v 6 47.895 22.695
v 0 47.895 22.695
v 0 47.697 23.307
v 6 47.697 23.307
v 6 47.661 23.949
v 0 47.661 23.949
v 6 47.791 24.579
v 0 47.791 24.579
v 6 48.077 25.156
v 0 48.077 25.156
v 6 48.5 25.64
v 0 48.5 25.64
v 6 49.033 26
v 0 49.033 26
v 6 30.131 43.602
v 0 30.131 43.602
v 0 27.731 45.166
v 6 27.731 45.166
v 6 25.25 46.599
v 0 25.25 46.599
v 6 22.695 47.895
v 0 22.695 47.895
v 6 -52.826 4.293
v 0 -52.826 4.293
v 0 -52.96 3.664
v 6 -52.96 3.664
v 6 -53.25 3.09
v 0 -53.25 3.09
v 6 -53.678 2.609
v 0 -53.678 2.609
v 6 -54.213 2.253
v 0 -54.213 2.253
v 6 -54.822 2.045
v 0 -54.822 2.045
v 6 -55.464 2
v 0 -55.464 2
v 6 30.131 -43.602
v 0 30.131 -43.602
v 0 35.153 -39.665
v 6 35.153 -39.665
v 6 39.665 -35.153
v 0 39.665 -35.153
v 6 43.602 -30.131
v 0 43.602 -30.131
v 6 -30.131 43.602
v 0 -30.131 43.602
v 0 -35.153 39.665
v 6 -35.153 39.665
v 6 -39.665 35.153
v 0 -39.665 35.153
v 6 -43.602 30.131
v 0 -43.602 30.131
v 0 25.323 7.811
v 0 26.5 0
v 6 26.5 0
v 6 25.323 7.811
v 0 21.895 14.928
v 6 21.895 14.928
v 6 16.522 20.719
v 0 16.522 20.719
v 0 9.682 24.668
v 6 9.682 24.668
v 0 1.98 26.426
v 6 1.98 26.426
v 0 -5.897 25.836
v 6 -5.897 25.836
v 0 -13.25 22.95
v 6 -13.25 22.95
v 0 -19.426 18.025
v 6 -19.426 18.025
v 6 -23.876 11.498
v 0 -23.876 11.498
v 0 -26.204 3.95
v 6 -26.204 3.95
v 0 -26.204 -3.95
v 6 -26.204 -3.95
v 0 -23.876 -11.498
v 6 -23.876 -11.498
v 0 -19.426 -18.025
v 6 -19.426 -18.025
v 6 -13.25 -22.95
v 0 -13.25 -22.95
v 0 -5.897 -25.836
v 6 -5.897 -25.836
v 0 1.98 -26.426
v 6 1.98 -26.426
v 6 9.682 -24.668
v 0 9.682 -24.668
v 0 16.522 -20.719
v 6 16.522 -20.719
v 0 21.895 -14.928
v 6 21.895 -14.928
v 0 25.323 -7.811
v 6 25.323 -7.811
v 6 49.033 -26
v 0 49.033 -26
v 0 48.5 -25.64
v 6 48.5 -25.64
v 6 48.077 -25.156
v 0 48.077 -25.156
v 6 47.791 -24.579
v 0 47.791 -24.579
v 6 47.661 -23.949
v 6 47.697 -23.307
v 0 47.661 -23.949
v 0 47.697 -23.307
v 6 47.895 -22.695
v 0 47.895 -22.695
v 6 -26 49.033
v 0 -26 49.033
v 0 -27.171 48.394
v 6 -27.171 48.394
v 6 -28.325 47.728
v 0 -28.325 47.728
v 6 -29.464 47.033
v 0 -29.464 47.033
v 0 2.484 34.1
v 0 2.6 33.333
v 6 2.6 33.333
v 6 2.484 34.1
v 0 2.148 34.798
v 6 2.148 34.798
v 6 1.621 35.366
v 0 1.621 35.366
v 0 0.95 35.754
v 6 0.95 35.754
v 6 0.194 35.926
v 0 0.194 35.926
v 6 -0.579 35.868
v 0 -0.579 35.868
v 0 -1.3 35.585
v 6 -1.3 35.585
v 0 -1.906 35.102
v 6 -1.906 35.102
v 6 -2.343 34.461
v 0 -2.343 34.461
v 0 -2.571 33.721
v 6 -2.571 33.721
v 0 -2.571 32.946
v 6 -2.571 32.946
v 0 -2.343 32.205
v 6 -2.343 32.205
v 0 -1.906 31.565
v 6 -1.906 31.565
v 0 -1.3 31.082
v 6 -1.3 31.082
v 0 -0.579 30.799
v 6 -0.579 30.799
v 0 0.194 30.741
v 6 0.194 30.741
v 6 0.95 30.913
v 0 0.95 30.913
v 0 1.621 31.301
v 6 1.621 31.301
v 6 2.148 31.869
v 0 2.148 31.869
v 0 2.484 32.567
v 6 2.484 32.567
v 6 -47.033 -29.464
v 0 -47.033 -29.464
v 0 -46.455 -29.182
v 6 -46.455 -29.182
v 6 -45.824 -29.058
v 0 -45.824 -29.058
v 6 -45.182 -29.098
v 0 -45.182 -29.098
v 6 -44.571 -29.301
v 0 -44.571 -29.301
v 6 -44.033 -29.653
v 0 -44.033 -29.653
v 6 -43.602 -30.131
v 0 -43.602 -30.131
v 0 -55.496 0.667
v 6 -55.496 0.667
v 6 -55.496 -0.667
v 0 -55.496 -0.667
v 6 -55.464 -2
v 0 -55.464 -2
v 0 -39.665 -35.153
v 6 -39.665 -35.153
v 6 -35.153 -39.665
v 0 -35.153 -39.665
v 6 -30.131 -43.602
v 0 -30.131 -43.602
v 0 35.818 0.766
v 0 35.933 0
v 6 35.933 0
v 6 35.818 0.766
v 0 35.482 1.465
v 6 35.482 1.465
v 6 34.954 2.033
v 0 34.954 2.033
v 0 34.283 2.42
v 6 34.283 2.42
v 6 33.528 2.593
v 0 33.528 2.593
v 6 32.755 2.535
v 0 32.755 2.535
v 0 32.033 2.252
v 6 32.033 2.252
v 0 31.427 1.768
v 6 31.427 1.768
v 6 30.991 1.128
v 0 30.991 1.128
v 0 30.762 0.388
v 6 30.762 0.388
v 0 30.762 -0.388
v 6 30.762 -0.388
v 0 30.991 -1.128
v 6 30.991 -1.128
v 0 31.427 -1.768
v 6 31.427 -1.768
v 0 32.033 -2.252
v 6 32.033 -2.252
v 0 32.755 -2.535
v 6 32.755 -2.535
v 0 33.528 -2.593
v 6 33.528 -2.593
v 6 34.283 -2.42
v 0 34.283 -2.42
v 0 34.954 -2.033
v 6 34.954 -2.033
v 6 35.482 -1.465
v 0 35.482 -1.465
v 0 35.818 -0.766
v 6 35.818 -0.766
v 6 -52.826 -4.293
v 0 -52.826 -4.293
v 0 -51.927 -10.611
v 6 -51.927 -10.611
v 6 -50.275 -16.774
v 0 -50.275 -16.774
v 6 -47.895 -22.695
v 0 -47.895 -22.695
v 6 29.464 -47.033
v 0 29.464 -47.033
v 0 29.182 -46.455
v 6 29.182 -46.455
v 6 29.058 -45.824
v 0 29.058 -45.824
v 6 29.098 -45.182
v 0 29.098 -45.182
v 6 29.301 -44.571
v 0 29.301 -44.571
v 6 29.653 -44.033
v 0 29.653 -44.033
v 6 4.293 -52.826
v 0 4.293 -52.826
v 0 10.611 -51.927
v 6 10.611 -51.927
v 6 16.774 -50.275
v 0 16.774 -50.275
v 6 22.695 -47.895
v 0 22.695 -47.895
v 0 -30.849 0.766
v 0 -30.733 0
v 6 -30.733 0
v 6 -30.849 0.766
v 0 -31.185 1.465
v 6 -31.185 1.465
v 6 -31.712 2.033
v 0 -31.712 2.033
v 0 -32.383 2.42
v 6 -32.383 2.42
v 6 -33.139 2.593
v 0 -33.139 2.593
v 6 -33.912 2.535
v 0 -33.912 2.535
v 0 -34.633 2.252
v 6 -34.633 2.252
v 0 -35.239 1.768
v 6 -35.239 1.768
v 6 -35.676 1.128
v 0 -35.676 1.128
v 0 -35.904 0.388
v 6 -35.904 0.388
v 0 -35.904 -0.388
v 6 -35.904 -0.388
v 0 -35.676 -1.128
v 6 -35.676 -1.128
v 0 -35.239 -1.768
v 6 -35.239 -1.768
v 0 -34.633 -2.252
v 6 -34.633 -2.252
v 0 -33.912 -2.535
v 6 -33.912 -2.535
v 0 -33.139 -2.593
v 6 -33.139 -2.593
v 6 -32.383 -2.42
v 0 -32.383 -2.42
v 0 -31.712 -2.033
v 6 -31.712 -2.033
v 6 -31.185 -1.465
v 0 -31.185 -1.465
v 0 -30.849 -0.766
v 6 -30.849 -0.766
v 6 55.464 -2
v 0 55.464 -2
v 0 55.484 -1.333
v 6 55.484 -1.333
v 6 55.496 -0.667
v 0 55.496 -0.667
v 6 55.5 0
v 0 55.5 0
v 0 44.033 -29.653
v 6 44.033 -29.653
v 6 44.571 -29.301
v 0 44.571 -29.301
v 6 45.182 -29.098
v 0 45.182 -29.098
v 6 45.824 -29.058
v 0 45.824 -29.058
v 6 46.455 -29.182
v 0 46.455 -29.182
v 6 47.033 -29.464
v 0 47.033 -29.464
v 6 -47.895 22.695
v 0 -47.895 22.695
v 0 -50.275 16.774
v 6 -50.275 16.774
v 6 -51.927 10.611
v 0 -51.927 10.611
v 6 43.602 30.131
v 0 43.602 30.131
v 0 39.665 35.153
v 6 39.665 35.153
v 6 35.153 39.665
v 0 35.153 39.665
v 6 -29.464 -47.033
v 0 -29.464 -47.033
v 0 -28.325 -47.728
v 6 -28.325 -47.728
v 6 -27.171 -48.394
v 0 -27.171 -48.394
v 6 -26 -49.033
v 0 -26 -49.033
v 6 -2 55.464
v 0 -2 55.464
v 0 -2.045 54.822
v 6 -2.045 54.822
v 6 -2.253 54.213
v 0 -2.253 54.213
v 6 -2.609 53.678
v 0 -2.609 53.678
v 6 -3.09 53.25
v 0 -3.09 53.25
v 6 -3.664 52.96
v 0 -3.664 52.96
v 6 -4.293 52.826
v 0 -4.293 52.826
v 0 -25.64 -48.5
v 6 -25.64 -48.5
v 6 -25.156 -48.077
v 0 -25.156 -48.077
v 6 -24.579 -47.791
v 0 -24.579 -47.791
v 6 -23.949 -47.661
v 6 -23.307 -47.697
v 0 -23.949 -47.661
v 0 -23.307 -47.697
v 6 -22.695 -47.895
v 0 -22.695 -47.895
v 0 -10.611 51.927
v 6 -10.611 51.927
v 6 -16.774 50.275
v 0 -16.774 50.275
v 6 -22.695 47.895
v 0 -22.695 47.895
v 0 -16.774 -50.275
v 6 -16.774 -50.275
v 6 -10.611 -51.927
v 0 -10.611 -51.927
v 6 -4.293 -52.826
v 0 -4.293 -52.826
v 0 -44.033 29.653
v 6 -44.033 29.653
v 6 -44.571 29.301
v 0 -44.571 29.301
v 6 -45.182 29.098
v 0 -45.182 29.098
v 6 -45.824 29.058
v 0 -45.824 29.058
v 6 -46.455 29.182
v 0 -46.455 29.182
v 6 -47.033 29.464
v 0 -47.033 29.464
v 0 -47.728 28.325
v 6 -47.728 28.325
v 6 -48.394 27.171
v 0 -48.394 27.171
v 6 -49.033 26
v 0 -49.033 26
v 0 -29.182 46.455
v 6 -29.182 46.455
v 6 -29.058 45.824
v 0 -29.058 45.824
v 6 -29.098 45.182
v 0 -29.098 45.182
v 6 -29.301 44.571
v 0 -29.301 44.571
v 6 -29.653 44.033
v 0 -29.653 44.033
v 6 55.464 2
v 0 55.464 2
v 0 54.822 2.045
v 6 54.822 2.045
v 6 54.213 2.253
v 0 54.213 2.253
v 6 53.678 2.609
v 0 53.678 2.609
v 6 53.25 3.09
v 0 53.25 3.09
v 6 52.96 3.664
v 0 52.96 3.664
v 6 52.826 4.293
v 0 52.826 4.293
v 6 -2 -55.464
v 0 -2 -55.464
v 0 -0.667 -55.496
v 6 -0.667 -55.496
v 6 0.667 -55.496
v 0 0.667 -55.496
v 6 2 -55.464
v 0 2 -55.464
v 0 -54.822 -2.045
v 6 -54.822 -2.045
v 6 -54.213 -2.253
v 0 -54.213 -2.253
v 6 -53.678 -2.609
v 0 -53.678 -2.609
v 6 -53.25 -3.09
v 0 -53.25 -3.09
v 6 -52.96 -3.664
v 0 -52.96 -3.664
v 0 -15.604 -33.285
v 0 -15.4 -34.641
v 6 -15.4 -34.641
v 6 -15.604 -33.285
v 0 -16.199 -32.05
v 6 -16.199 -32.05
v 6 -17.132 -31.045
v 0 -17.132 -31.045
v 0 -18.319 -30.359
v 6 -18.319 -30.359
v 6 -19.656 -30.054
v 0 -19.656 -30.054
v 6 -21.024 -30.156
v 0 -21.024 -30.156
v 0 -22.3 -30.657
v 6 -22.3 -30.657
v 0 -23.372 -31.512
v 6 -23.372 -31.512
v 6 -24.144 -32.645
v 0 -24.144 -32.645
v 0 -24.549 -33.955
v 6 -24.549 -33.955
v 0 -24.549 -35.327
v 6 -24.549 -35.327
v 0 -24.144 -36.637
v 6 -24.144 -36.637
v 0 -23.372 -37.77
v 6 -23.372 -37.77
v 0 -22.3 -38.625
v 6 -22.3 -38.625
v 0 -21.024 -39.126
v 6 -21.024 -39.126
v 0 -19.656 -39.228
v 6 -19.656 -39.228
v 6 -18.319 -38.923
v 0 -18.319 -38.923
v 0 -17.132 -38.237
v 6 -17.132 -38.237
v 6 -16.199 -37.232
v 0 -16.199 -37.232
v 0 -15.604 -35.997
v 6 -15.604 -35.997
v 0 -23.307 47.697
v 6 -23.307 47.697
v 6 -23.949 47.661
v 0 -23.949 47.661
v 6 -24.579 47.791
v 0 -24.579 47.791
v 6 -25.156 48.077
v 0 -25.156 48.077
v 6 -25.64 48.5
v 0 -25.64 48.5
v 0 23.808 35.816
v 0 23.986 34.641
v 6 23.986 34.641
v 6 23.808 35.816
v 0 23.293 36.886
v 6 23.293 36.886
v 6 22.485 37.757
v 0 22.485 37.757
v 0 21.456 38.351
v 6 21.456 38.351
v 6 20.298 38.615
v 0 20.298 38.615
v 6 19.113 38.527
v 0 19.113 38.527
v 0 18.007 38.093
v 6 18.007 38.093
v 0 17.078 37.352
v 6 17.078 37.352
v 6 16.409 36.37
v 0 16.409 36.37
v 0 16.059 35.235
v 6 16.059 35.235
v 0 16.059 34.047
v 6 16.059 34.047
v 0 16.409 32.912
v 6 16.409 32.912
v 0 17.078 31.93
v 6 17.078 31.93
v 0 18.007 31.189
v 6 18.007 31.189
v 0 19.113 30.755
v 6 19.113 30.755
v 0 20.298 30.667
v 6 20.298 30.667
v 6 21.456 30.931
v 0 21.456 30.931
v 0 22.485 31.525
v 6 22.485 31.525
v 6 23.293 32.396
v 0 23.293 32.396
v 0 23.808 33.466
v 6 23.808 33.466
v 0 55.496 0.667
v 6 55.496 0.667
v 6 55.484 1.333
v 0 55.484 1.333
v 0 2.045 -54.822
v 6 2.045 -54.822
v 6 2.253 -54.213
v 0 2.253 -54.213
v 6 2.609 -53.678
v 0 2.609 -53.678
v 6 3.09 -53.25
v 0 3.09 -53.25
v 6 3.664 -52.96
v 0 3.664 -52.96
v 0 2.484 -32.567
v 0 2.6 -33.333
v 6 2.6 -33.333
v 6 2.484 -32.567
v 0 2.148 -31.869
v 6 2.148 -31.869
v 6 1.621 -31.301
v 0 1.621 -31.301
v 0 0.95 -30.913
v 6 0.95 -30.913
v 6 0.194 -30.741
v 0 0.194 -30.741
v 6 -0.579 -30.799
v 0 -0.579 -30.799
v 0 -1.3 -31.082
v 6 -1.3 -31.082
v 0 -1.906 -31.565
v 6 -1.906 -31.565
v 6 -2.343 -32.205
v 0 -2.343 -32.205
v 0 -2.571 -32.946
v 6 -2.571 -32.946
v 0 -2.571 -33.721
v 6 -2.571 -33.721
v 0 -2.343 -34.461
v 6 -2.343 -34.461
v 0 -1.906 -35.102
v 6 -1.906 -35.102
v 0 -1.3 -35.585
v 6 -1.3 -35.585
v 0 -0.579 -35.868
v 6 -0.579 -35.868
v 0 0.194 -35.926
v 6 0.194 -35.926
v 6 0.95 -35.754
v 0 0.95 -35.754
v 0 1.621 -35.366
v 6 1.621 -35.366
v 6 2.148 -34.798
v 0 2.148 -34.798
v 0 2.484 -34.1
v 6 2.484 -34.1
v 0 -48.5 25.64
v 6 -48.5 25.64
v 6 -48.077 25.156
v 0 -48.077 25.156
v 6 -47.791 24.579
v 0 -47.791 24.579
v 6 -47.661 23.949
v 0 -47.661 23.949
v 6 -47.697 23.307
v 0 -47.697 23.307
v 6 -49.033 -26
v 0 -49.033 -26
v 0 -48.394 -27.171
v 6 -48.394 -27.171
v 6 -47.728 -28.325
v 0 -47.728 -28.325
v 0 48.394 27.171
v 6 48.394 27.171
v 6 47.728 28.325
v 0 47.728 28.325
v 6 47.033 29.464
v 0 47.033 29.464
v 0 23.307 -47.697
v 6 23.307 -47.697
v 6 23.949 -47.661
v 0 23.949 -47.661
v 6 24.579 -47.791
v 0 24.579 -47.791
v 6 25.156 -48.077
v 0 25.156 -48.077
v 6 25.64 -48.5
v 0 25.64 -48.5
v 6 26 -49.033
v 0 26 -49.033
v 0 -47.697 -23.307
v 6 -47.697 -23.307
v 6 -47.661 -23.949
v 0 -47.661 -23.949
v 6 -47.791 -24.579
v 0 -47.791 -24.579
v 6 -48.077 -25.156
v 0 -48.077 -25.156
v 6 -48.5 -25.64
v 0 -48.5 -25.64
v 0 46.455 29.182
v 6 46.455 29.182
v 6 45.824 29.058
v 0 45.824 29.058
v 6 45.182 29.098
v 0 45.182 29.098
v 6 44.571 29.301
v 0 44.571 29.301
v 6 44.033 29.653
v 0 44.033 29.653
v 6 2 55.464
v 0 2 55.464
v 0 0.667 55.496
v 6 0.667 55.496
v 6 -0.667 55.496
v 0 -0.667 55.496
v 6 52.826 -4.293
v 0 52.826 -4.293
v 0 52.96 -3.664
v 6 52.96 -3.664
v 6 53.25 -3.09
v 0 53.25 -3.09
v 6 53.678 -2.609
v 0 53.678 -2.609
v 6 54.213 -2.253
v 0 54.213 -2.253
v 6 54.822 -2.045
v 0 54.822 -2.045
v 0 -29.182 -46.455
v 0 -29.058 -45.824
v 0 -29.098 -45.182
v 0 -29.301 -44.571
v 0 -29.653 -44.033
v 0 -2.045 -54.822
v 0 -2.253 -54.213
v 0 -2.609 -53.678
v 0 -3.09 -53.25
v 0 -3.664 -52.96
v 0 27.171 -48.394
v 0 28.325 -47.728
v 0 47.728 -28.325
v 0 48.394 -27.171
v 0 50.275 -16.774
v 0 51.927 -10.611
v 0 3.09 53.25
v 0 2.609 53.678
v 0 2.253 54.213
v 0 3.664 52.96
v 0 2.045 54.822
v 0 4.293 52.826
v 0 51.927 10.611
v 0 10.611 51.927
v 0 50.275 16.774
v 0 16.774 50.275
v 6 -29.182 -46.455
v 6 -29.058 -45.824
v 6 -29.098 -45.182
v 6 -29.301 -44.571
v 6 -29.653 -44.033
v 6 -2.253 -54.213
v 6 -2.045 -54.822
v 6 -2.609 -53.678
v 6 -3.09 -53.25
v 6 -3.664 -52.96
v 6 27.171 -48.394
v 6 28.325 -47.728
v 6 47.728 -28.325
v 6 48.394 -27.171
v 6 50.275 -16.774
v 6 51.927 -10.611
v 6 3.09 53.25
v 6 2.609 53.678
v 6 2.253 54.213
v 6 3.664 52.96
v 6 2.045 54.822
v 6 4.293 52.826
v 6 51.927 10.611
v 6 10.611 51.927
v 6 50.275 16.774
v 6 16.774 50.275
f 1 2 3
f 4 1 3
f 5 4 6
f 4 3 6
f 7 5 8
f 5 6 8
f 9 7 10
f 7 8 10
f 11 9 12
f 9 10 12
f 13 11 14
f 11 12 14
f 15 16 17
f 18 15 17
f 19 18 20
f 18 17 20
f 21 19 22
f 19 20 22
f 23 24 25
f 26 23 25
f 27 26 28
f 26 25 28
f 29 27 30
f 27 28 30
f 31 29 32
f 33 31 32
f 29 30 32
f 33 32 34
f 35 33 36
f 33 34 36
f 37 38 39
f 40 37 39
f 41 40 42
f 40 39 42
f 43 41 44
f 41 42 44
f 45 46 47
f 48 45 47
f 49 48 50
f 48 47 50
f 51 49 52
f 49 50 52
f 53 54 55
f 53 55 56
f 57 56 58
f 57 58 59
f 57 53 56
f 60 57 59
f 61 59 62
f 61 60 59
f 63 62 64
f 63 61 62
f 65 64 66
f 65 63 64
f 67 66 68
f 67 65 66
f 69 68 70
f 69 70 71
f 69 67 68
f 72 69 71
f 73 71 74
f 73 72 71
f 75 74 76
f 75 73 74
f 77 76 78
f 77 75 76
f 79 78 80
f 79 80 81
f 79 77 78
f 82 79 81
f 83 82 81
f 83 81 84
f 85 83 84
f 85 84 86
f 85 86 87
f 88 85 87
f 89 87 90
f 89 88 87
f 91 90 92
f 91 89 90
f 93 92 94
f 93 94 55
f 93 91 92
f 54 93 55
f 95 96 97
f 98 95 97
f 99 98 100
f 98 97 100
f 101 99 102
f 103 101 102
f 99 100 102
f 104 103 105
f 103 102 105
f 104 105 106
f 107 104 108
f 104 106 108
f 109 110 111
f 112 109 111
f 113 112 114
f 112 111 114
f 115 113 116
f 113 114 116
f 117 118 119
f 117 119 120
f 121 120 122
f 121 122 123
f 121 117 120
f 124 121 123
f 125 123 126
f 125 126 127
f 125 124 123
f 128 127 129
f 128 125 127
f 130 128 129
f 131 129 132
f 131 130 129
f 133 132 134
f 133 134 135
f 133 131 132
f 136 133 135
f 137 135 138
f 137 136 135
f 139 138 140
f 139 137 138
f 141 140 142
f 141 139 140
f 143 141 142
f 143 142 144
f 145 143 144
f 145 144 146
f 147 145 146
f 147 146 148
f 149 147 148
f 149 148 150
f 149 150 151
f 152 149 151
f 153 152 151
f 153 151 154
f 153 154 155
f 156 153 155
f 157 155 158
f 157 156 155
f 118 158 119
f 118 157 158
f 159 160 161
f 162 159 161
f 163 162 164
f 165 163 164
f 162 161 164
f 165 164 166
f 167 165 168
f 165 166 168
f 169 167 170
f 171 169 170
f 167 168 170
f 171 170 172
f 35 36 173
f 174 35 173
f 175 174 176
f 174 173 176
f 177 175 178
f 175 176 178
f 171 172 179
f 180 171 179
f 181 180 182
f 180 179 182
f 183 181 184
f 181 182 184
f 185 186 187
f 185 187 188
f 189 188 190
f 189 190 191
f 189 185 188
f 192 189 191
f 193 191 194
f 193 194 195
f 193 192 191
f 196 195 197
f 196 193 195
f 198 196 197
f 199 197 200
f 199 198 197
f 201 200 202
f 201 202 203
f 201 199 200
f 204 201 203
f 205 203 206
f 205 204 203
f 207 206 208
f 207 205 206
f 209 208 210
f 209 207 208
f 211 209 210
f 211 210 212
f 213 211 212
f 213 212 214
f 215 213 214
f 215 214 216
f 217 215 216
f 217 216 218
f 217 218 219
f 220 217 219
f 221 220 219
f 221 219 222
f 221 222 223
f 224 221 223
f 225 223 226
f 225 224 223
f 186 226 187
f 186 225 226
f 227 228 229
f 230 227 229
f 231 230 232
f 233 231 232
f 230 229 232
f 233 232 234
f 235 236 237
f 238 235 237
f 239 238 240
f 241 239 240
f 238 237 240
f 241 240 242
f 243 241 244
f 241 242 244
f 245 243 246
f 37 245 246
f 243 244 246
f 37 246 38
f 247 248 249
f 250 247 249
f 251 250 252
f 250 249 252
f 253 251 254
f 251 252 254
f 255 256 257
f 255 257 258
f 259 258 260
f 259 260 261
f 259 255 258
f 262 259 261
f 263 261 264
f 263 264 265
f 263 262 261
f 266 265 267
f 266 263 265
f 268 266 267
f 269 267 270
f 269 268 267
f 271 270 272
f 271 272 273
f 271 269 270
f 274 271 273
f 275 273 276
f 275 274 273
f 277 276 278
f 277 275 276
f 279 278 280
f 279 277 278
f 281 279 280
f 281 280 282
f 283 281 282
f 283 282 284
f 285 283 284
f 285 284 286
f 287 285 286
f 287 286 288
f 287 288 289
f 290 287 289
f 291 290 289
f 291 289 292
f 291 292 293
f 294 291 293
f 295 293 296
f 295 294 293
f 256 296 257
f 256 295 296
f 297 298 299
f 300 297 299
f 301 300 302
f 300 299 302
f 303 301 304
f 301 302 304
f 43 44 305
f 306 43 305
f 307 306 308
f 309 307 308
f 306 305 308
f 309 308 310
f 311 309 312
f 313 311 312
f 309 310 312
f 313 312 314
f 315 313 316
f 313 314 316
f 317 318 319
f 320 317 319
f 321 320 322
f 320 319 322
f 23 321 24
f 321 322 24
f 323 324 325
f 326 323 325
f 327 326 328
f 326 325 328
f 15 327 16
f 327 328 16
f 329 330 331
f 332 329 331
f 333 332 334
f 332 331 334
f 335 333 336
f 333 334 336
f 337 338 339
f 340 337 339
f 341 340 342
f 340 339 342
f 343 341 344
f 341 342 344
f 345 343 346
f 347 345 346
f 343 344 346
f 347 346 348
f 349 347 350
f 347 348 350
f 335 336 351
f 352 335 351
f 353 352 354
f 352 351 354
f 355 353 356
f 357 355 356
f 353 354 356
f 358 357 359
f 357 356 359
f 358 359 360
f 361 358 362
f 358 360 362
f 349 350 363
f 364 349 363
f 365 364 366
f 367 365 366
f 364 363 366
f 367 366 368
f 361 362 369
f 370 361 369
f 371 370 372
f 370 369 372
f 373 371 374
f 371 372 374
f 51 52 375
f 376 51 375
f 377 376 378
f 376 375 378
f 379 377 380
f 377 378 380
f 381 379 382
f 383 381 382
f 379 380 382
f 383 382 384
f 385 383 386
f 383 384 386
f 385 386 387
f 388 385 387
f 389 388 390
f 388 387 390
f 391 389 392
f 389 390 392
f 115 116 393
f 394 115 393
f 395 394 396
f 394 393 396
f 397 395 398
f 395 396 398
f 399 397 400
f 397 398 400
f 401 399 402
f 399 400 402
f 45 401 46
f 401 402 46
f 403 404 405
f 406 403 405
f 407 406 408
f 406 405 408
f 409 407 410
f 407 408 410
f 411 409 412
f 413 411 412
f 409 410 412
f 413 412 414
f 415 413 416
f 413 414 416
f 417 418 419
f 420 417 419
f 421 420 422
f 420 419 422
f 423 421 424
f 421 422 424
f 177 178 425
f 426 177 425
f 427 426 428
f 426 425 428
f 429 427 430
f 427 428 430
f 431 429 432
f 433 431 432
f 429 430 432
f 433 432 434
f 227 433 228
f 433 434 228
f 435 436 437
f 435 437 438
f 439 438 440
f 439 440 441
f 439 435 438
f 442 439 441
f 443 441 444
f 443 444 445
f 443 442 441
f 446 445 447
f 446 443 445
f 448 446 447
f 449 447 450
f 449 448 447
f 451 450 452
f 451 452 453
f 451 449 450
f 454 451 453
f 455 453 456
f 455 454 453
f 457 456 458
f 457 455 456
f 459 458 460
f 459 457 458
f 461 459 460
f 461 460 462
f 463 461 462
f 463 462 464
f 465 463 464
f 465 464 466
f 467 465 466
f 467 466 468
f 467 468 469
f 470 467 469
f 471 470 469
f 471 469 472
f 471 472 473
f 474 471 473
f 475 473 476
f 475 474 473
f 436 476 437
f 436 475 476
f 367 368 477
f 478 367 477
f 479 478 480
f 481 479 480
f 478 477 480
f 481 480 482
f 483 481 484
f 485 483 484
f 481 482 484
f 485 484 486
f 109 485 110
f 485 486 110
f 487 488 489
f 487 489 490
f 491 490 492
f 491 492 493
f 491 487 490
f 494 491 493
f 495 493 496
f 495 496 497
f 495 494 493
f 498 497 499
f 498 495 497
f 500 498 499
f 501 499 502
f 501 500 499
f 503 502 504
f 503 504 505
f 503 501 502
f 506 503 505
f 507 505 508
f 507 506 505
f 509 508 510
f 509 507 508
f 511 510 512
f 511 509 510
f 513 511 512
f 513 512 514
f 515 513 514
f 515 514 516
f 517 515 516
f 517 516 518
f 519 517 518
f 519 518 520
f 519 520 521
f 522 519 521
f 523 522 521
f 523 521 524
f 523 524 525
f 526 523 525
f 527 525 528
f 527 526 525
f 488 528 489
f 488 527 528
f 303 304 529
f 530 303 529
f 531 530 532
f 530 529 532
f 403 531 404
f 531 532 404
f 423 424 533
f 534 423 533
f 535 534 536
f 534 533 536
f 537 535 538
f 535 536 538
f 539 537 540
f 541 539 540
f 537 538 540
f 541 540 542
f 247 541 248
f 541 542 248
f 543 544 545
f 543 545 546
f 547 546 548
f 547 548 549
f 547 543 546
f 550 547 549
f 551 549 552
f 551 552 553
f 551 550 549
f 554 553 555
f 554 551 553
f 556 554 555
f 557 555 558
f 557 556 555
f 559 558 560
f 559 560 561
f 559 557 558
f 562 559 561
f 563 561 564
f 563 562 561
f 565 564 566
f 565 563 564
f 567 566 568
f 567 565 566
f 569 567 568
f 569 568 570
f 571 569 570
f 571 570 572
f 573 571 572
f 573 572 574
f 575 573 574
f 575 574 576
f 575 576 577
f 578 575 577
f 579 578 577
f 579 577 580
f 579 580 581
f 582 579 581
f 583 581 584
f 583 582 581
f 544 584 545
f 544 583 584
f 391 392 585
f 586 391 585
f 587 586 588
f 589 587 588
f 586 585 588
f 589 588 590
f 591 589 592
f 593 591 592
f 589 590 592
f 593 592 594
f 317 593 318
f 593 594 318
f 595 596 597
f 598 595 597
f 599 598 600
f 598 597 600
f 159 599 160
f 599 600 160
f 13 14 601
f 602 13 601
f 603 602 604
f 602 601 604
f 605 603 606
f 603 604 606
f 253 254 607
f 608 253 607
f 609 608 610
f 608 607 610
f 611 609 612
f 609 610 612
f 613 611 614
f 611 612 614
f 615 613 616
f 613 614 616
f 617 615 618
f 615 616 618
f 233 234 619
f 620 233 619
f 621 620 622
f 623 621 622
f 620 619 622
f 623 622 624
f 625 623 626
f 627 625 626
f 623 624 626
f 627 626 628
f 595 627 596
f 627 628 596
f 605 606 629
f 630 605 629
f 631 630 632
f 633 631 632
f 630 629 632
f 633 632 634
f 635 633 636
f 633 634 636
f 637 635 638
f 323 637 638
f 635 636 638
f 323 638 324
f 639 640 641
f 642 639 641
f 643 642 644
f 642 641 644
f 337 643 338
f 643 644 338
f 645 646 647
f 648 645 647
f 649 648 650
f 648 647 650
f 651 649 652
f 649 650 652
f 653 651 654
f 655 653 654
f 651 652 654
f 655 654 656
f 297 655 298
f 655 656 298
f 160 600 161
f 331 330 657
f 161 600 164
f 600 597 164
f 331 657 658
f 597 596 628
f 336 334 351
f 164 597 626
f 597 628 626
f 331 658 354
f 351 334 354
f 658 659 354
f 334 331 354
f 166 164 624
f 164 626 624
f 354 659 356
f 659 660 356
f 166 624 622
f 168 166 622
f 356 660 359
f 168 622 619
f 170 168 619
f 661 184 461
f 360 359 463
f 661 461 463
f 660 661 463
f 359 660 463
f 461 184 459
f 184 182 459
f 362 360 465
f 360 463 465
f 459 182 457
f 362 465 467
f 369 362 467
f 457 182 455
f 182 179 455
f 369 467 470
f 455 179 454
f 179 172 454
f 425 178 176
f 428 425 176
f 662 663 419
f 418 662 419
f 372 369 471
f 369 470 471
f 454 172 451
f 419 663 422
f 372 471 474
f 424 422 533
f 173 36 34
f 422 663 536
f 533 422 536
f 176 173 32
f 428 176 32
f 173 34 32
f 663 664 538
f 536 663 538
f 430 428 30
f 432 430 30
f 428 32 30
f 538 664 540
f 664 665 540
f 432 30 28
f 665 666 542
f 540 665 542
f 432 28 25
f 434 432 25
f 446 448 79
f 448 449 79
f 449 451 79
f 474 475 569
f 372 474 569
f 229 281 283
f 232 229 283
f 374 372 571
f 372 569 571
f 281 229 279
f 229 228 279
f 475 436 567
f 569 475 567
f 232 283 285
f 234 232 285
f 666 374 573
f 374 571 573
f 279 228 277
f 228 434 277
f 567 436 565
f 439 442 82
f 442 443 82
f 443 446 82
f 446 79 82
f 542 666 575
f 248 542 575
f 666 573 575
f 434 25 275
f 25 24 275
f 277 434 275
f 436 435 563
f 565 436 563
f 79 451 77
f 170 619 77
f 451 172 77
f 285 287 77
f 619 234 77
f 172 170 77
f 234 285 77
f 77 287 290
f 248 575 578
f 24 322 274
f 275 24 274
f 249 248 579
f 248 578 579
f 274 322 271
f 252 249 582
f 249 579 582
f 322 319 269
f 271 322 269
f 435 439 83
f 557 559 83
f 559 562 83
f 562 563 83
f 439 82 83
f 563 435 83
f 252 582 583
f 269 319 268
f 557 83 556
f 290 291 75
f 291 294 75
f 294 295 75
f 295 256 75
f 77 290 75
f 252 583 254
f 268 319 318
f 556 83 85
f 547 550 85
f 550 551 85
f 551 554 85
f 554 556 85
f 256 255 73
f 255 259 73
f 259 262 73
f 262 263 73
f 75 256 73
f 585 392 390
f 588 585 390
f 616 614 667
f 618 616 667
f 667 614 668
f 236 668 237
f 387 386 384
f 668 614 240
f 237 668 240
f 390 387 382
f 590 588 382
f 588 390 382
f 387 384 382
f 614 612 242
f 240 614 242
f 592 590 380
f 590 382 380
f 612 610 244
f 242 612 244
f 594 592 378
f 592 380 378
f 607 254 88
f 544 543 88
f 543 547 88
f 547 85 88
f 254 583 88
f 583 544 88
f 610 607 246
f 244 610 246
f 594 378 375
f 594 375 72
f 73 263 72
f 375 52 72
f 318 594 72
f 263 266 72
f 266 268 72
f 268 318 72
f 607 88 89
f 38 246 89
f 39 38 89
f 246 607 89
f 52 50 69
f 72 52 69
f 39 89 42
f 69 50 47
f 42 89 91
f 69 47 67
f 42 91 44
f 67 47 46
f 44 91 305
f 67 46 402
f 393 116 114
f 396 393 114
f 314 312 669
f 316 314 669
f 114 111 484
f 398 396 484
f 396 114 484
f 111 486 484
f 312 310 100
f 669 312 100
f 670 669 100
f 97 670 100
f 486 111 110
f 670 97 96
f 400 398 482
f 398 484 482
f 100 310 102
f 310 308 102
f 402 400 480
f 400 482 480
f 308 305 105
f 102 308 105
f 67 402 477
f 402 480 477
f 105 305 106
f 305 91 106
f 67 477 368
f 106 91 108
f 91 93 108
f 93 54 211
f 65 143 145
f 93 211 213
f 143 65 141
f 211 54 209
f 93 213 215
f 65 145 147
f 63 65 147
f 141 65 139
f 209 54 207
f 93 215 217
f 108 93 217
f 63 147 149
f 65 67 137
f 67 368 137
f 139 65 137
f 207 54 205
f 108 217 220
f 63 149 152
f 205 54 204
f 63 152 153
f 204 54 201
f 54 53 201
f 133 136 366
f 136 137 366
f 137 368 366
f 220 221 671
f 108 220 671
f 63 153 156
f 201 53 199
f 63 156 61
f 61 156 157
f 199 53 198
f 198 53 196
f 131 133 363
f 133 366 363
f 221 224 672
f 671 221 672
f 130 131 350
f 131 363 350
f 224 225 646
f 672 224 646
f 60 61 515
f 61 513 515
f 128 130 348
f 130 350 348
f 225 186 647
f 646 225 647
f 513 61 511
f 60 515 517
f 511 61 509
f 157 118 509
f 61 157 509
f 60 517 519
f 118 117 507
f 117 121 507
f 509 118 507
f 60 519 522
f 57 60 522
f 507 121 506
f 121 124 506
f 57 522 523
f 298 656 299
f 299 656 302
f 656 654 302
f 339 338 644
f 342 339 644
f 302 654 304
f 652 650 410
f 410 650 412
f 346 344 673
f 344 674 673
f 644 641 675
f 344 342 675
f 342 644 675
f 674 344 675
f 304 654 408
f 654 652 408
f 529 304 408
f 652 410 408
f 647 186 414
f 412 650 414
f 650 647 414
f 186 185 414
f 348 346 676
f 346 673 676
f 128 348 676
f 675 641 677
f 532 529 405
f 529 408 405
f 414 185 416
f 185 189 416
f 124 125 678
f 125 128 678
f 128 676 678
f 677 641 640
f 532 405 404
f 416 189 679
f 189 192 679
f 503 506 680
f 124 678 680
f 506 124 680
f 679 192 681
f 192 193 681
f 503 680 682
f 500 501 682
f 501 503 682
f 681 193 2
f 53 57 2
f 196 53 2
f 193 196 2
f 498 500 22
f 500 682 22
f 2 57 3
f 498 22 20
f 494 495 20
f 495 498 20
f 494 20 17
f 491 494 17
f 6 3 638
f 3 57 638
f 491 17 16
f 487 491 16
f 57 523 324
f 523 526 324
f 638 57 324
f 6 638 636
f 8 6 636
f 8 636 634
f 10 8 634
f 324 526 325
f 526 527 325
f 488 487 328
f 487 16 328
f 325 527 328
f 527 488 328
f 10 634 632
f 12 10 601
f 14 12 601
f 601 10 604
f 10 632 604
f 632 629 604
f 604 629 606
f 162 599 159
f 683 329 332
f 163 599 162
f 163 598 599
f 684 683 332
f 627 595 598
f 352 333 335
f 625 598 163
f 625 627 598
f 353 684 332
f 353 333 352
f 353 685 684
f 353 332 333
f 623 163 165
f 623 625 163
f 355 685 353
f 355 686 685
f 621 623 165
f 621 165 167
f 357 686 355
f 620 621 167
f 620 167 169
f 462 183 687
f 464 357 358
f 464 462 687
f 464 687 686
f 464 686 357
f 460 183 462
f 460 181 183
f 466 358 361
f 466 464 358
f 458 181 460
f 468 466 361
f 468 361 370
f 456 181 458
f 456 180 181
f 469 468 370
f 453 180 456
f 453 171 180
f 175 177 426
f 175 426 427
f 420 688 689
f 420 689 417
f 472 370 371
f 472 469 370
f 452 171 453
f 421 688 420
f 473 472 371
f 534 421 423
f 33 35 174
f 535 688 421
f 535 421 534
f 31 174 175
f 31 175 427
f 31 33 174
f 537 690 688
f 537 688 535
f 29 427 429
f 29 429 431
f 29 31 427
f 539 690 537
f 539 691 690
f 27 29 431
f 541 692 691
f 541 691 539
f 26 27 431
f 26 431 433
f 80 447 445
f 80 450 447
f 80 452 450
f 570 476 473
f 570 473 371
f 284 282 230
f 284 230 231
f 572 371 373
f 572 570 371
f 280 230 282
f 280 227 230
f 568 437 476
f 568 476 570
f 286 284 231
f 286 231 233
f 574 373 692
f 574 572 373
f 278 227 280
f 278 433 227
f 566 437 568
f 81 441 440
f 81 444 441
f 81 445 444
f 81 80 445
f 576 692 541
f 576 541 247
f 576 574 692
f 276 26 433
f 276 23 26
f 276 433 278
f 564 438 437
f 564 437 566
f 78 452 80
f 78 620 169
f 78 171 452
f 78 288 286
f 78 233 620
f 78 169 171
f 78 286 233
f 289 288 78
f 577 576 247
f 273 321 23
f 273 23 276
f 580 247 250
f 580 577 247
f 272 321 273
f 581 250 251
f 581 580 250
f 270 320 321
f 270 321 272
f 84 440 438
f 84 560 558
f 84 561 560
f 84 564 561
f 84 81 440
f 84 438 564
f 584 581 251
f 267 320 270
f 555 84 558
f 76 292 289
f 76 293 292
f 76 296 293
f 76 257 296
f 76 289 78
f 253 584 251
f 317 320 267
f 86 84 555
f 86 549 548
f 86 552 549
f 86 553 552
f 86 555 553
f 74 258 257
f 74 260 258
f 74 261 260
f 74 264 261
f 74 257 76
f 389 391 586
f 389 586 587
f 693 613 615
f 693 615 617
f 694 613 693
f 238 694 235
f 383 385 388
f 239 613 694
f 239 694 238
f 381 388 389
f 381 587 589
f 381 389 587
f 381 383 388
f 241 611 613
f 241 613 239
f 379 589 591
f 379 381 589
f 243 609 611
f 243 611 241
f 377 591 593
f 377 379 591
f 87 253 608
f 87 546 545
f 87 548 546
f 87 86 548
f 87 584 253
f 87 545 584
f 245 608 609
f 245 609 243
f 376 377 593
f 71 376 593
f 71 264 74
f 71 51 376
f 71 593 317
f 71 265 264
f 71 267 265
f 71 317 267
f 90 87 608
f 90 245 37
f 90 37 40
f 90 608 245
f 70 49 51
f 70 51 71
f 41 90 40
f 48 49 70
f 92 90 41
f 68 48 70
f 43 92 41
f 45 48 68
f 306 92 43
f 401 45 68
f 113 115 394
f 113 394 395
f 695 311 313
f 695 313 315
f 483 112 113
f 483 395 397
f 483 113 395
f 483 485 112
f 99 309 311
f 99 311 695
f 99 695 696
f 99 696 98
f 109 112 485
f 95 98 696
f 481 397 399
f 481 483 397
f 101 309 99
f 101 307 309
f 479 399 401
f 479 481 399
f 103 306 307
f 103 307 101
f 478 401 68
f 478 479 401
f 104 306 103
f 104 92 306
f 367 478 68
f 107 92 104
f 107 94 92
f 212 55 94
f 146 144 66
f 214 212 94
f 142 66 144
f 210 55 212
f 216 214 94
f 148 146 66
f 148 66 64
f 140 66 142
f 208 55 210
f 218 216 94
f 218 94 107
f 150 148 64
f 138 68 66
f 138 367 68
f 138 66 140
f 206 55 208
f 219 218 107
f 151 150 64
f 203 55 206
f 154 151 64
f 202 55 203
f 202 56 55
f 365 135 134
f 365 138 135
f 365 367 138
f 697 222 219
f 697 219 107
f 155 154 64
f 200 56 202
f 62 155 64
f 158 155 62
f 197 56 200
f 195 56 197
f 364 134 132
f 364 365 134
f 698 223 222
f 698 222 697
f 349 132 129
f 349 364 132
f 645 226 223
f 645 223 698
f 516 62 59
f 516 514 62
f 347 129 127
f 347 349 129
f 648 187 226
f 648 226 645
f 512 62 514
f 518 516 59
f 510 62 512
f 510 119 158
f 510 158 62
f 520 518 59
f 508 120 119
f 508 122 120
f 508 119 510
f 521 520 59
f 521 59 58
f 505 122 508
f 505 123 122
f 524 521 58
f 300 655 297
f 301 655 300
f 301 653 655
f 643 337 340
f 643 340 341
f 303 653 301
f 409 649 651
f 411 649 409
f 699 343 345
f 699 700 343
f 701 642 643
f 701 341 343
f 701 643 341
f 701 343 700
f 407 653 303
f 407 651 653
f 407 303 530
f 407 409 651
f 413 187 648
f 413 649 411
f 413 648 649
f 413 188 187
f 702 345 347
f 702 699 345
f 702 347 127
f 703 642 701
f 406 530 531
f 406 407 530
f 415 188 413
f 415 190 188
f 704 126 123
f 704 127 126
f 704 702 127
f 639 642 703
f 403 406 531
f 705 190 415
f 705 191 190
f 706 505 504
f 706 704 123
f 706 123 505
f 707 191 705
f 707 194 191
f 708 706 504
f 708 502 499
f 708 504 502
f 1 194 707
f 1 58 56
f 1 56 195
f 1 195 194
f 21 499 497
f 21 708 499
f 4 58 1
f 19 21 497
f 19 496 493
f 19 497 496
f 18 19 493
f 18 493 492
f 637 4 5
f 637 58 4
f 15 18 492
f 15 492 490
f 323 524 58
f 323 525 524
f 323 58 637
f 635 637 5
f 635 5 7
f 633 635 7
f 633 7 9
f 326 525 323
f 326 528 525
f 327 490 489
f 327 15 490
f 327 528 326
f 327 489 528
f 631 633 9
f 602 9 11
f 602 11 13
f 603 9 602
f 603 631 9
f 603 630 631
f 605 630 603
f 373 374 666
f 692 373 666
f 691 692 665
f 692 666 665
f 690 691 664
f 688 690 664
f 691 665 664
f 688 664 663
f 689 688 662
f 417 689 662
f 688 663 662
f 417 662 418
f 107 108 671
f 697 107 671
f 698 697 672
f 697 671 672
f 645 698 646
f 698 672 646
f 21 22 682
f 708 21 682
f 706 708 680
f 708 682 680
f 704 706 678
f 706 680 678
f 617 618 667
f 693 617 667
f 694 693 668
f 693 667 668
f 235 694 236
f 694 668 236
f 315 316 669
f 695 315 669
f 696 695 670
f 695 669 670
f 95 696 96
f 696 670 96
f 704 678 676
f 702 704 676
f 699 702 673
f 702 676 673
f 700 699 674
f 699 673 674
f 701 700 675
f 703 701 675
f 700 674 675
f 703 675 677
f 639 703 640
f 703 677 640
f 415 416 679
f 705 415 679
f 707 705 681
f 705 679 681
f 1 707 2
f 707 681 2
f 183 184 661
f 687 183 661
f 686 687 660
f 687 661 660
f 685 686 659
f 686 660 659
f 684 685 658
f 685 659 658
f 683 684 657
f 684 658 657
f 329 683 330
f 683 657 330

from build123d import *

# Parameters (mm, degrees)
F0_R     = 4.6
F0_R_2   = 2.6
F0_R_3   = 26.5
F0_R_4   = 3.9855
F1_DEPTH = 6


with BuildPart() as f1:
    # F0 (on Right) → F1 (new body)
    with BuildSketch(Plane.YZ):
        with BuildLine():
            ThreePointArc((-4.2932039319, 52.8258308027), (0, 53), (4.2932039319, 52.8258308027))
            ThreePointArc((4.2932039319, 52.8258308027), (2.6089111213, 53.6775003275), (2, 55.4639522573))
            ThreePointArc((2, 55.4639522573), (0, 55.5), (-2, 55.4639522573))
            ThreePointArc((-2, 55.4639522573), (-2.6089111213, 53.6775003275), (-4.2932039319, 52.8258308027))
        make_face()
        with BuildLine():
            ThreePointArc((-47.8951133262, 22.6948919246), (-45.8993463831, 26.5000000302), (-43.6019095663, 30.1309389528))
            ThreePointArc((-43.6019095663, 30.1309389528), (-45.1816234045, 29.0981334574), (-47.0331916491, 29.4640269362))
            ThreePointArc((-47.0331916491, 29.4640269362), (-48.06440991, 27.75), (-49.0331916491, 25.9999253211))
            ThreePointArc((-49.0331916491, 25.9999253211), (-47.7905344905, 24.5793669568), (-47.8951133262, 22.6948919246))
        make_face()
        with BuildLine():
            ThreePointArc((52.8258308027, -4.2932039319), (52.9564397998, -2.1483676891), (53, 0))
            ThreePointArc((53, 0), (52.9564397998, 2.1483676891), (52.8258308027, 4.2932039319))
            ThreePointArc((52.8258308027, 4.2932039319), (51.1940687891, 13.717409406), (47.8951134033, 22.6948917618))
            ThreePointArc((47.8951134033, 22.6948917618), (45.8993464347, 26.4999999409), (43.6019095811, 30.1309389313))
            ThreePointArc((43.6019095811, 30.1309389313), (37.4766594029, 37.4766594029), (30.1309389313, 43.6019095811))
            ThreePointArc((30.1309389313, 43.6019095811), (26.5000000189, 45.8993463896), (22.6948919246, 47.8951133262))
            ThreePointArc((22.6948919246, 47.8951133262), (13.717409493, 51.1940687658), (4.2932039319, 52.8258308027))
            ThreePointArc((4.2932039319, 52.8258308027), (0, 53), (-4.2932039319, 52.8258308027))
            ThreePointArc((-4.2932039319, 52.8258308027), (-13.717409493, 51.1940687658), (-22.6948919246, 47.8951133262))
            ThreePointArc((-22.6948919246, 47.8951133262), (-26.4999999415, 45.8993464343), (-30.1309387843, 43.6019096827))
            ThreePointArc((-30.1309387843, 43.6019096827), (-37.4766593305, 37.4766594753), (-43.6019095663, 30.1309389528))
            ThreePointArc((-43.6019095663, 30.1309389528), (-45.8993463831, 26.5000000302), (-47.8951133262, 22.6948919246))
            ThreePointArc((-47.8951133262, 22.6948919246), (-51.1940687658, 13.717409493), (-52.8258308027, 4.2932039319))
            ThreePointArc((-52.8258308027, 4.2932039319), (-53, 0), (-52.8258308027, -4.2932039319))
            ThreePointArc((-52.8258308027, -4.2932039319), (-51.1940687658, -13.717409493), (-47.8951133262, -22.6948919246))
            ThreePointArc((-47.8951133262, -22.6948919246), (-45.8993463896, -26.5000000189), (-43.6019095811, -30.1309389313))
            ThreePointArc((-43.6019095811, -30.1309389313), (-37.4766594372, -37.4766593686), (-30.1309390111, -43.6019095259))
            ThreePointArc((-30.1309390111, -43.6019095259), (-26.4999999348, -45.8993464382), (-22.6948916613, -47.895113451))
            ThreePointArc((-22.6948916613, -47.895113451), (-13.7174093743, -51.1940687976), (-4.2932039775, -52.825830799))
            ThreePointArc((-4.2932039775, -52.825830799), (-1.709e-07, -53), (4.2932036369, -52.8258308267))
            ThreePointArc((4.2932036369, -52.8258308267), (13.717409263, -51.1940688275), (22.6948917618, -47.8951134033))
            ThreePointArc((22.6948917618, -47.8951134033), (26.4999999409, -45.8993464347), (30.1309389313, -43.6019095811))
            ThreePointArc((30.1309389313, -43.6019095811), (37.4766593397, -37.4766594661), (43.6019094795, -30.1309390784))
            ThreePointArc((43.6019094795, -30.1309390784), (45.8993464178, -26.4999999702), (47.895113451, -22.6948916613))
            ThreePointArc((47.895113451, -22.6948916613), (51.1940688036, -13.7174093523), (52.8258308027, -4.2932039319))
        make_face()
        with Locations((-20, -34.6410161514)):
            Circle(F0_R, mode=Mode.SUBTRACT)
        with Locations((0, -33.3333333333)):
            Circle(F0_R_2, mode=Mode.SUBTRACT)
        with Locations((-33.3333333333, 0)):
            Circle(F0_R_2, mode=Mode.SUBTRACT)
        Circle(F0_R_3, mode=Mode.SUBTRACT)
        with Locations((33.3333333333, 0)):
            Circle(F0_R_2, mode=Mode.SUBTRACT)
        with Locations((0, 33.3333333333)):
            Circle(F0_R_2, mode=Mode.SUBTRACT)
        with Locations((20, 34.6410161514)):
            Circle(F0_R_4, mode=Mode.SUBTRACT)
        with BuildLine():
            ThreePointArc((-52.8258308027, -4.2932039319), (-53, 0), (-52.8258308027, 4.2932039319))
            ThreePointArc((-52.8258308027, 4.2932039319), (-53.6775003275, 2.6089111213), (-55.4639522573, 2))
            ThreePointArc((-55.4639522573, 2), (-55.5, 0), (-55.4639522573, -2))
            ThreePointArc((-55.4639522573, -2), (-53.6775003275, -2.6089111213), (-52.8258308027, -4.2932039319))
        make_face()
        with BuildLine():
            ThreePointArc((-47.0331916491, -29.4640269362), (-45.1816234173, -29.0981334549), (-43.6019095811, -30.1309389313))
            ThreePointArc((-43.6019095811, -30.1309389313), (-45.8993463896, -26.5000000189), (-47.8951133262, -22.6948919246))
            ThreePointArc((-47.8951133262, -22.6948919246), (-47.7905344905, -24.5793669568), (-49.0331916491, -25.9999253211))
            ThreePointArc((-49.0331916491, -25.9999253211), (-48.06440991, -27.75), (-47.0331916491, -29.4640269362))
        make_face()
        with BuildLine():
            ThreePointArc((-25.9999253211, -49.0331916491), (-24.5793668191, -47.790534443), (-22.6948916613, -47.895113451))
            ThreePointArc((-22.6948916613, -47.895113451), (-26.4999999348, -45.8993464382), (-30.1309390111, -43.6019095259))
            ThreePointArc((-30.1309390111, -43.6019095259), (-29.0981334642, -45.1816233697), (-29.4640269362, -47.0331916491))
            ThreePointArc((-29.4640269362, -47.0331916491), (-27.75, -48.06440991), (-25.9999253211, -49.0331916491))
        make_face()
        with BuildLine():
            ThreePointArc((2, -55.4639522573), (2.6089110242, -53.6775004392), (4.2932036369, -52.8258308267))
            ThreePointArc((4.2932036369, -52.8258308267), (-1.709e-07, -53), (-4.2932039775, -52.825830799))
            ThreePointArc((-4.2932039775, -52.825830799), (-2.6089111363, -53.6775003102), (-2, -55.4639522573))
            ThreePointArc((-2, -55.4639522573), (0, -55.5), (2, -55.4639522573))
        make_face()
        with BuildLine():
            ThreePointArc((29.4640269362, -47.0331916491), (29.0981334549, -45.1816234173), (30.1309389313, -43.6019095811))
            ThreePointArc((30.1309389313, -43.6019095811), (26.4999999409, -45.8993464347), (22.6948917618, -47.8951134033))
            ThreePointArc((22.6948917618, -47.8951134033), (24.5793668717, -47.7905344612), (25.9999253211, -49.0331916491))
            ThreePointArc((25.9999253211, -49.0331916491), (27.75, -48.06440991), (29.4640269362, -47.0331916491))
        make_face()
        with BuildLine():
            ThreePointArc((49.0331916491, -25.9999253211), (47.790534443, -24.5793668191), (47.895113451, -22.6948916613))
            ThreePointArc((47.895113451, -22.6948916613), (45.8993464178, -26.4999999702), (43.6019094795, -30.1309390784))
            ThreePointArc((43.6019094795, -30.1309390784), (45.1816233296, -29.098133472), (47.0331916491, -29.4640269362))
            ThreePointArc((47.0331916491, -29.4640269362), (48.06440991, -27.75), (49.0331916491, -25.9999253211))
        make_face()
        with BuildLine():
            ThreePointArc((52.8258308027, 4.2932039319), (52.9564397998, 2.1483676891), (53, 0))
            ThreePointArc((53, 0), (52.9564397998, -2.1483676891), (52.8258308027, -4.2932039319))
            ThreePointArc((52.8258308027, -4.2932039319), (53.6775003275, -2.6089111213), (55.4639522573, -2))
            ThreePointArc((55.4639522573, -2), (55.4909873325, -1.0001624168), (55.5, 0))
            ThreePointArc((55.5, 0), (55.4909873325, 1.0001624168), (55.4639522573, 2))
            ThreePointArc((55.4639522573, 2), (53.6775003275, 2.6089111213), (52.8258308027, 4.2932039319))
        make_face()
        with BuildLine():
            ThreePointArc((43.6019095811, 30.1309389313), (45.8993464347, 26.4999999409), (47.8951134033, 22.6948917618))
            ThreePointArc((47.8951134033, 22.6948917618), (47.7905344612, 24.5793668717), (49.0331916491, 25.9999253211))
            ThreePointArc((49.0331916491, 25.9999253211), (48.06440991, 27.75), (47.0331916491, 29.4640269362))
            ThreePointArc((47.0331916491, 29.4640269362), (45.1816234173, 29.0981334549), (43.6019095811, 30.1309389313))
        make_face()
        with BuildLine():
            ThreePointArc((-30.1309387843, 43.6019096827), (-26.4999999415, 45.8993464343), (-22.6948919246, 47.8951133262))
            ThreePointArc((-22.6948919246, 47.8951133262), (-24.5793669568, 47.7905344905), (-25.9999253211, 49.0331916491))
            ThreePointArc((-25.9999253211, 49.0331916491), (-27.75, 48.06440991), (-29.4640269362, 47.0331916491))
            ThreePointArc((-29.4640269362, 47.0331916491), (-29.0981334379, 45.1816235051), (-30.1309387843, 43.6019096827))
        make_face()
    extrude(amount=F1_DEPTH)


solid = f1.part
